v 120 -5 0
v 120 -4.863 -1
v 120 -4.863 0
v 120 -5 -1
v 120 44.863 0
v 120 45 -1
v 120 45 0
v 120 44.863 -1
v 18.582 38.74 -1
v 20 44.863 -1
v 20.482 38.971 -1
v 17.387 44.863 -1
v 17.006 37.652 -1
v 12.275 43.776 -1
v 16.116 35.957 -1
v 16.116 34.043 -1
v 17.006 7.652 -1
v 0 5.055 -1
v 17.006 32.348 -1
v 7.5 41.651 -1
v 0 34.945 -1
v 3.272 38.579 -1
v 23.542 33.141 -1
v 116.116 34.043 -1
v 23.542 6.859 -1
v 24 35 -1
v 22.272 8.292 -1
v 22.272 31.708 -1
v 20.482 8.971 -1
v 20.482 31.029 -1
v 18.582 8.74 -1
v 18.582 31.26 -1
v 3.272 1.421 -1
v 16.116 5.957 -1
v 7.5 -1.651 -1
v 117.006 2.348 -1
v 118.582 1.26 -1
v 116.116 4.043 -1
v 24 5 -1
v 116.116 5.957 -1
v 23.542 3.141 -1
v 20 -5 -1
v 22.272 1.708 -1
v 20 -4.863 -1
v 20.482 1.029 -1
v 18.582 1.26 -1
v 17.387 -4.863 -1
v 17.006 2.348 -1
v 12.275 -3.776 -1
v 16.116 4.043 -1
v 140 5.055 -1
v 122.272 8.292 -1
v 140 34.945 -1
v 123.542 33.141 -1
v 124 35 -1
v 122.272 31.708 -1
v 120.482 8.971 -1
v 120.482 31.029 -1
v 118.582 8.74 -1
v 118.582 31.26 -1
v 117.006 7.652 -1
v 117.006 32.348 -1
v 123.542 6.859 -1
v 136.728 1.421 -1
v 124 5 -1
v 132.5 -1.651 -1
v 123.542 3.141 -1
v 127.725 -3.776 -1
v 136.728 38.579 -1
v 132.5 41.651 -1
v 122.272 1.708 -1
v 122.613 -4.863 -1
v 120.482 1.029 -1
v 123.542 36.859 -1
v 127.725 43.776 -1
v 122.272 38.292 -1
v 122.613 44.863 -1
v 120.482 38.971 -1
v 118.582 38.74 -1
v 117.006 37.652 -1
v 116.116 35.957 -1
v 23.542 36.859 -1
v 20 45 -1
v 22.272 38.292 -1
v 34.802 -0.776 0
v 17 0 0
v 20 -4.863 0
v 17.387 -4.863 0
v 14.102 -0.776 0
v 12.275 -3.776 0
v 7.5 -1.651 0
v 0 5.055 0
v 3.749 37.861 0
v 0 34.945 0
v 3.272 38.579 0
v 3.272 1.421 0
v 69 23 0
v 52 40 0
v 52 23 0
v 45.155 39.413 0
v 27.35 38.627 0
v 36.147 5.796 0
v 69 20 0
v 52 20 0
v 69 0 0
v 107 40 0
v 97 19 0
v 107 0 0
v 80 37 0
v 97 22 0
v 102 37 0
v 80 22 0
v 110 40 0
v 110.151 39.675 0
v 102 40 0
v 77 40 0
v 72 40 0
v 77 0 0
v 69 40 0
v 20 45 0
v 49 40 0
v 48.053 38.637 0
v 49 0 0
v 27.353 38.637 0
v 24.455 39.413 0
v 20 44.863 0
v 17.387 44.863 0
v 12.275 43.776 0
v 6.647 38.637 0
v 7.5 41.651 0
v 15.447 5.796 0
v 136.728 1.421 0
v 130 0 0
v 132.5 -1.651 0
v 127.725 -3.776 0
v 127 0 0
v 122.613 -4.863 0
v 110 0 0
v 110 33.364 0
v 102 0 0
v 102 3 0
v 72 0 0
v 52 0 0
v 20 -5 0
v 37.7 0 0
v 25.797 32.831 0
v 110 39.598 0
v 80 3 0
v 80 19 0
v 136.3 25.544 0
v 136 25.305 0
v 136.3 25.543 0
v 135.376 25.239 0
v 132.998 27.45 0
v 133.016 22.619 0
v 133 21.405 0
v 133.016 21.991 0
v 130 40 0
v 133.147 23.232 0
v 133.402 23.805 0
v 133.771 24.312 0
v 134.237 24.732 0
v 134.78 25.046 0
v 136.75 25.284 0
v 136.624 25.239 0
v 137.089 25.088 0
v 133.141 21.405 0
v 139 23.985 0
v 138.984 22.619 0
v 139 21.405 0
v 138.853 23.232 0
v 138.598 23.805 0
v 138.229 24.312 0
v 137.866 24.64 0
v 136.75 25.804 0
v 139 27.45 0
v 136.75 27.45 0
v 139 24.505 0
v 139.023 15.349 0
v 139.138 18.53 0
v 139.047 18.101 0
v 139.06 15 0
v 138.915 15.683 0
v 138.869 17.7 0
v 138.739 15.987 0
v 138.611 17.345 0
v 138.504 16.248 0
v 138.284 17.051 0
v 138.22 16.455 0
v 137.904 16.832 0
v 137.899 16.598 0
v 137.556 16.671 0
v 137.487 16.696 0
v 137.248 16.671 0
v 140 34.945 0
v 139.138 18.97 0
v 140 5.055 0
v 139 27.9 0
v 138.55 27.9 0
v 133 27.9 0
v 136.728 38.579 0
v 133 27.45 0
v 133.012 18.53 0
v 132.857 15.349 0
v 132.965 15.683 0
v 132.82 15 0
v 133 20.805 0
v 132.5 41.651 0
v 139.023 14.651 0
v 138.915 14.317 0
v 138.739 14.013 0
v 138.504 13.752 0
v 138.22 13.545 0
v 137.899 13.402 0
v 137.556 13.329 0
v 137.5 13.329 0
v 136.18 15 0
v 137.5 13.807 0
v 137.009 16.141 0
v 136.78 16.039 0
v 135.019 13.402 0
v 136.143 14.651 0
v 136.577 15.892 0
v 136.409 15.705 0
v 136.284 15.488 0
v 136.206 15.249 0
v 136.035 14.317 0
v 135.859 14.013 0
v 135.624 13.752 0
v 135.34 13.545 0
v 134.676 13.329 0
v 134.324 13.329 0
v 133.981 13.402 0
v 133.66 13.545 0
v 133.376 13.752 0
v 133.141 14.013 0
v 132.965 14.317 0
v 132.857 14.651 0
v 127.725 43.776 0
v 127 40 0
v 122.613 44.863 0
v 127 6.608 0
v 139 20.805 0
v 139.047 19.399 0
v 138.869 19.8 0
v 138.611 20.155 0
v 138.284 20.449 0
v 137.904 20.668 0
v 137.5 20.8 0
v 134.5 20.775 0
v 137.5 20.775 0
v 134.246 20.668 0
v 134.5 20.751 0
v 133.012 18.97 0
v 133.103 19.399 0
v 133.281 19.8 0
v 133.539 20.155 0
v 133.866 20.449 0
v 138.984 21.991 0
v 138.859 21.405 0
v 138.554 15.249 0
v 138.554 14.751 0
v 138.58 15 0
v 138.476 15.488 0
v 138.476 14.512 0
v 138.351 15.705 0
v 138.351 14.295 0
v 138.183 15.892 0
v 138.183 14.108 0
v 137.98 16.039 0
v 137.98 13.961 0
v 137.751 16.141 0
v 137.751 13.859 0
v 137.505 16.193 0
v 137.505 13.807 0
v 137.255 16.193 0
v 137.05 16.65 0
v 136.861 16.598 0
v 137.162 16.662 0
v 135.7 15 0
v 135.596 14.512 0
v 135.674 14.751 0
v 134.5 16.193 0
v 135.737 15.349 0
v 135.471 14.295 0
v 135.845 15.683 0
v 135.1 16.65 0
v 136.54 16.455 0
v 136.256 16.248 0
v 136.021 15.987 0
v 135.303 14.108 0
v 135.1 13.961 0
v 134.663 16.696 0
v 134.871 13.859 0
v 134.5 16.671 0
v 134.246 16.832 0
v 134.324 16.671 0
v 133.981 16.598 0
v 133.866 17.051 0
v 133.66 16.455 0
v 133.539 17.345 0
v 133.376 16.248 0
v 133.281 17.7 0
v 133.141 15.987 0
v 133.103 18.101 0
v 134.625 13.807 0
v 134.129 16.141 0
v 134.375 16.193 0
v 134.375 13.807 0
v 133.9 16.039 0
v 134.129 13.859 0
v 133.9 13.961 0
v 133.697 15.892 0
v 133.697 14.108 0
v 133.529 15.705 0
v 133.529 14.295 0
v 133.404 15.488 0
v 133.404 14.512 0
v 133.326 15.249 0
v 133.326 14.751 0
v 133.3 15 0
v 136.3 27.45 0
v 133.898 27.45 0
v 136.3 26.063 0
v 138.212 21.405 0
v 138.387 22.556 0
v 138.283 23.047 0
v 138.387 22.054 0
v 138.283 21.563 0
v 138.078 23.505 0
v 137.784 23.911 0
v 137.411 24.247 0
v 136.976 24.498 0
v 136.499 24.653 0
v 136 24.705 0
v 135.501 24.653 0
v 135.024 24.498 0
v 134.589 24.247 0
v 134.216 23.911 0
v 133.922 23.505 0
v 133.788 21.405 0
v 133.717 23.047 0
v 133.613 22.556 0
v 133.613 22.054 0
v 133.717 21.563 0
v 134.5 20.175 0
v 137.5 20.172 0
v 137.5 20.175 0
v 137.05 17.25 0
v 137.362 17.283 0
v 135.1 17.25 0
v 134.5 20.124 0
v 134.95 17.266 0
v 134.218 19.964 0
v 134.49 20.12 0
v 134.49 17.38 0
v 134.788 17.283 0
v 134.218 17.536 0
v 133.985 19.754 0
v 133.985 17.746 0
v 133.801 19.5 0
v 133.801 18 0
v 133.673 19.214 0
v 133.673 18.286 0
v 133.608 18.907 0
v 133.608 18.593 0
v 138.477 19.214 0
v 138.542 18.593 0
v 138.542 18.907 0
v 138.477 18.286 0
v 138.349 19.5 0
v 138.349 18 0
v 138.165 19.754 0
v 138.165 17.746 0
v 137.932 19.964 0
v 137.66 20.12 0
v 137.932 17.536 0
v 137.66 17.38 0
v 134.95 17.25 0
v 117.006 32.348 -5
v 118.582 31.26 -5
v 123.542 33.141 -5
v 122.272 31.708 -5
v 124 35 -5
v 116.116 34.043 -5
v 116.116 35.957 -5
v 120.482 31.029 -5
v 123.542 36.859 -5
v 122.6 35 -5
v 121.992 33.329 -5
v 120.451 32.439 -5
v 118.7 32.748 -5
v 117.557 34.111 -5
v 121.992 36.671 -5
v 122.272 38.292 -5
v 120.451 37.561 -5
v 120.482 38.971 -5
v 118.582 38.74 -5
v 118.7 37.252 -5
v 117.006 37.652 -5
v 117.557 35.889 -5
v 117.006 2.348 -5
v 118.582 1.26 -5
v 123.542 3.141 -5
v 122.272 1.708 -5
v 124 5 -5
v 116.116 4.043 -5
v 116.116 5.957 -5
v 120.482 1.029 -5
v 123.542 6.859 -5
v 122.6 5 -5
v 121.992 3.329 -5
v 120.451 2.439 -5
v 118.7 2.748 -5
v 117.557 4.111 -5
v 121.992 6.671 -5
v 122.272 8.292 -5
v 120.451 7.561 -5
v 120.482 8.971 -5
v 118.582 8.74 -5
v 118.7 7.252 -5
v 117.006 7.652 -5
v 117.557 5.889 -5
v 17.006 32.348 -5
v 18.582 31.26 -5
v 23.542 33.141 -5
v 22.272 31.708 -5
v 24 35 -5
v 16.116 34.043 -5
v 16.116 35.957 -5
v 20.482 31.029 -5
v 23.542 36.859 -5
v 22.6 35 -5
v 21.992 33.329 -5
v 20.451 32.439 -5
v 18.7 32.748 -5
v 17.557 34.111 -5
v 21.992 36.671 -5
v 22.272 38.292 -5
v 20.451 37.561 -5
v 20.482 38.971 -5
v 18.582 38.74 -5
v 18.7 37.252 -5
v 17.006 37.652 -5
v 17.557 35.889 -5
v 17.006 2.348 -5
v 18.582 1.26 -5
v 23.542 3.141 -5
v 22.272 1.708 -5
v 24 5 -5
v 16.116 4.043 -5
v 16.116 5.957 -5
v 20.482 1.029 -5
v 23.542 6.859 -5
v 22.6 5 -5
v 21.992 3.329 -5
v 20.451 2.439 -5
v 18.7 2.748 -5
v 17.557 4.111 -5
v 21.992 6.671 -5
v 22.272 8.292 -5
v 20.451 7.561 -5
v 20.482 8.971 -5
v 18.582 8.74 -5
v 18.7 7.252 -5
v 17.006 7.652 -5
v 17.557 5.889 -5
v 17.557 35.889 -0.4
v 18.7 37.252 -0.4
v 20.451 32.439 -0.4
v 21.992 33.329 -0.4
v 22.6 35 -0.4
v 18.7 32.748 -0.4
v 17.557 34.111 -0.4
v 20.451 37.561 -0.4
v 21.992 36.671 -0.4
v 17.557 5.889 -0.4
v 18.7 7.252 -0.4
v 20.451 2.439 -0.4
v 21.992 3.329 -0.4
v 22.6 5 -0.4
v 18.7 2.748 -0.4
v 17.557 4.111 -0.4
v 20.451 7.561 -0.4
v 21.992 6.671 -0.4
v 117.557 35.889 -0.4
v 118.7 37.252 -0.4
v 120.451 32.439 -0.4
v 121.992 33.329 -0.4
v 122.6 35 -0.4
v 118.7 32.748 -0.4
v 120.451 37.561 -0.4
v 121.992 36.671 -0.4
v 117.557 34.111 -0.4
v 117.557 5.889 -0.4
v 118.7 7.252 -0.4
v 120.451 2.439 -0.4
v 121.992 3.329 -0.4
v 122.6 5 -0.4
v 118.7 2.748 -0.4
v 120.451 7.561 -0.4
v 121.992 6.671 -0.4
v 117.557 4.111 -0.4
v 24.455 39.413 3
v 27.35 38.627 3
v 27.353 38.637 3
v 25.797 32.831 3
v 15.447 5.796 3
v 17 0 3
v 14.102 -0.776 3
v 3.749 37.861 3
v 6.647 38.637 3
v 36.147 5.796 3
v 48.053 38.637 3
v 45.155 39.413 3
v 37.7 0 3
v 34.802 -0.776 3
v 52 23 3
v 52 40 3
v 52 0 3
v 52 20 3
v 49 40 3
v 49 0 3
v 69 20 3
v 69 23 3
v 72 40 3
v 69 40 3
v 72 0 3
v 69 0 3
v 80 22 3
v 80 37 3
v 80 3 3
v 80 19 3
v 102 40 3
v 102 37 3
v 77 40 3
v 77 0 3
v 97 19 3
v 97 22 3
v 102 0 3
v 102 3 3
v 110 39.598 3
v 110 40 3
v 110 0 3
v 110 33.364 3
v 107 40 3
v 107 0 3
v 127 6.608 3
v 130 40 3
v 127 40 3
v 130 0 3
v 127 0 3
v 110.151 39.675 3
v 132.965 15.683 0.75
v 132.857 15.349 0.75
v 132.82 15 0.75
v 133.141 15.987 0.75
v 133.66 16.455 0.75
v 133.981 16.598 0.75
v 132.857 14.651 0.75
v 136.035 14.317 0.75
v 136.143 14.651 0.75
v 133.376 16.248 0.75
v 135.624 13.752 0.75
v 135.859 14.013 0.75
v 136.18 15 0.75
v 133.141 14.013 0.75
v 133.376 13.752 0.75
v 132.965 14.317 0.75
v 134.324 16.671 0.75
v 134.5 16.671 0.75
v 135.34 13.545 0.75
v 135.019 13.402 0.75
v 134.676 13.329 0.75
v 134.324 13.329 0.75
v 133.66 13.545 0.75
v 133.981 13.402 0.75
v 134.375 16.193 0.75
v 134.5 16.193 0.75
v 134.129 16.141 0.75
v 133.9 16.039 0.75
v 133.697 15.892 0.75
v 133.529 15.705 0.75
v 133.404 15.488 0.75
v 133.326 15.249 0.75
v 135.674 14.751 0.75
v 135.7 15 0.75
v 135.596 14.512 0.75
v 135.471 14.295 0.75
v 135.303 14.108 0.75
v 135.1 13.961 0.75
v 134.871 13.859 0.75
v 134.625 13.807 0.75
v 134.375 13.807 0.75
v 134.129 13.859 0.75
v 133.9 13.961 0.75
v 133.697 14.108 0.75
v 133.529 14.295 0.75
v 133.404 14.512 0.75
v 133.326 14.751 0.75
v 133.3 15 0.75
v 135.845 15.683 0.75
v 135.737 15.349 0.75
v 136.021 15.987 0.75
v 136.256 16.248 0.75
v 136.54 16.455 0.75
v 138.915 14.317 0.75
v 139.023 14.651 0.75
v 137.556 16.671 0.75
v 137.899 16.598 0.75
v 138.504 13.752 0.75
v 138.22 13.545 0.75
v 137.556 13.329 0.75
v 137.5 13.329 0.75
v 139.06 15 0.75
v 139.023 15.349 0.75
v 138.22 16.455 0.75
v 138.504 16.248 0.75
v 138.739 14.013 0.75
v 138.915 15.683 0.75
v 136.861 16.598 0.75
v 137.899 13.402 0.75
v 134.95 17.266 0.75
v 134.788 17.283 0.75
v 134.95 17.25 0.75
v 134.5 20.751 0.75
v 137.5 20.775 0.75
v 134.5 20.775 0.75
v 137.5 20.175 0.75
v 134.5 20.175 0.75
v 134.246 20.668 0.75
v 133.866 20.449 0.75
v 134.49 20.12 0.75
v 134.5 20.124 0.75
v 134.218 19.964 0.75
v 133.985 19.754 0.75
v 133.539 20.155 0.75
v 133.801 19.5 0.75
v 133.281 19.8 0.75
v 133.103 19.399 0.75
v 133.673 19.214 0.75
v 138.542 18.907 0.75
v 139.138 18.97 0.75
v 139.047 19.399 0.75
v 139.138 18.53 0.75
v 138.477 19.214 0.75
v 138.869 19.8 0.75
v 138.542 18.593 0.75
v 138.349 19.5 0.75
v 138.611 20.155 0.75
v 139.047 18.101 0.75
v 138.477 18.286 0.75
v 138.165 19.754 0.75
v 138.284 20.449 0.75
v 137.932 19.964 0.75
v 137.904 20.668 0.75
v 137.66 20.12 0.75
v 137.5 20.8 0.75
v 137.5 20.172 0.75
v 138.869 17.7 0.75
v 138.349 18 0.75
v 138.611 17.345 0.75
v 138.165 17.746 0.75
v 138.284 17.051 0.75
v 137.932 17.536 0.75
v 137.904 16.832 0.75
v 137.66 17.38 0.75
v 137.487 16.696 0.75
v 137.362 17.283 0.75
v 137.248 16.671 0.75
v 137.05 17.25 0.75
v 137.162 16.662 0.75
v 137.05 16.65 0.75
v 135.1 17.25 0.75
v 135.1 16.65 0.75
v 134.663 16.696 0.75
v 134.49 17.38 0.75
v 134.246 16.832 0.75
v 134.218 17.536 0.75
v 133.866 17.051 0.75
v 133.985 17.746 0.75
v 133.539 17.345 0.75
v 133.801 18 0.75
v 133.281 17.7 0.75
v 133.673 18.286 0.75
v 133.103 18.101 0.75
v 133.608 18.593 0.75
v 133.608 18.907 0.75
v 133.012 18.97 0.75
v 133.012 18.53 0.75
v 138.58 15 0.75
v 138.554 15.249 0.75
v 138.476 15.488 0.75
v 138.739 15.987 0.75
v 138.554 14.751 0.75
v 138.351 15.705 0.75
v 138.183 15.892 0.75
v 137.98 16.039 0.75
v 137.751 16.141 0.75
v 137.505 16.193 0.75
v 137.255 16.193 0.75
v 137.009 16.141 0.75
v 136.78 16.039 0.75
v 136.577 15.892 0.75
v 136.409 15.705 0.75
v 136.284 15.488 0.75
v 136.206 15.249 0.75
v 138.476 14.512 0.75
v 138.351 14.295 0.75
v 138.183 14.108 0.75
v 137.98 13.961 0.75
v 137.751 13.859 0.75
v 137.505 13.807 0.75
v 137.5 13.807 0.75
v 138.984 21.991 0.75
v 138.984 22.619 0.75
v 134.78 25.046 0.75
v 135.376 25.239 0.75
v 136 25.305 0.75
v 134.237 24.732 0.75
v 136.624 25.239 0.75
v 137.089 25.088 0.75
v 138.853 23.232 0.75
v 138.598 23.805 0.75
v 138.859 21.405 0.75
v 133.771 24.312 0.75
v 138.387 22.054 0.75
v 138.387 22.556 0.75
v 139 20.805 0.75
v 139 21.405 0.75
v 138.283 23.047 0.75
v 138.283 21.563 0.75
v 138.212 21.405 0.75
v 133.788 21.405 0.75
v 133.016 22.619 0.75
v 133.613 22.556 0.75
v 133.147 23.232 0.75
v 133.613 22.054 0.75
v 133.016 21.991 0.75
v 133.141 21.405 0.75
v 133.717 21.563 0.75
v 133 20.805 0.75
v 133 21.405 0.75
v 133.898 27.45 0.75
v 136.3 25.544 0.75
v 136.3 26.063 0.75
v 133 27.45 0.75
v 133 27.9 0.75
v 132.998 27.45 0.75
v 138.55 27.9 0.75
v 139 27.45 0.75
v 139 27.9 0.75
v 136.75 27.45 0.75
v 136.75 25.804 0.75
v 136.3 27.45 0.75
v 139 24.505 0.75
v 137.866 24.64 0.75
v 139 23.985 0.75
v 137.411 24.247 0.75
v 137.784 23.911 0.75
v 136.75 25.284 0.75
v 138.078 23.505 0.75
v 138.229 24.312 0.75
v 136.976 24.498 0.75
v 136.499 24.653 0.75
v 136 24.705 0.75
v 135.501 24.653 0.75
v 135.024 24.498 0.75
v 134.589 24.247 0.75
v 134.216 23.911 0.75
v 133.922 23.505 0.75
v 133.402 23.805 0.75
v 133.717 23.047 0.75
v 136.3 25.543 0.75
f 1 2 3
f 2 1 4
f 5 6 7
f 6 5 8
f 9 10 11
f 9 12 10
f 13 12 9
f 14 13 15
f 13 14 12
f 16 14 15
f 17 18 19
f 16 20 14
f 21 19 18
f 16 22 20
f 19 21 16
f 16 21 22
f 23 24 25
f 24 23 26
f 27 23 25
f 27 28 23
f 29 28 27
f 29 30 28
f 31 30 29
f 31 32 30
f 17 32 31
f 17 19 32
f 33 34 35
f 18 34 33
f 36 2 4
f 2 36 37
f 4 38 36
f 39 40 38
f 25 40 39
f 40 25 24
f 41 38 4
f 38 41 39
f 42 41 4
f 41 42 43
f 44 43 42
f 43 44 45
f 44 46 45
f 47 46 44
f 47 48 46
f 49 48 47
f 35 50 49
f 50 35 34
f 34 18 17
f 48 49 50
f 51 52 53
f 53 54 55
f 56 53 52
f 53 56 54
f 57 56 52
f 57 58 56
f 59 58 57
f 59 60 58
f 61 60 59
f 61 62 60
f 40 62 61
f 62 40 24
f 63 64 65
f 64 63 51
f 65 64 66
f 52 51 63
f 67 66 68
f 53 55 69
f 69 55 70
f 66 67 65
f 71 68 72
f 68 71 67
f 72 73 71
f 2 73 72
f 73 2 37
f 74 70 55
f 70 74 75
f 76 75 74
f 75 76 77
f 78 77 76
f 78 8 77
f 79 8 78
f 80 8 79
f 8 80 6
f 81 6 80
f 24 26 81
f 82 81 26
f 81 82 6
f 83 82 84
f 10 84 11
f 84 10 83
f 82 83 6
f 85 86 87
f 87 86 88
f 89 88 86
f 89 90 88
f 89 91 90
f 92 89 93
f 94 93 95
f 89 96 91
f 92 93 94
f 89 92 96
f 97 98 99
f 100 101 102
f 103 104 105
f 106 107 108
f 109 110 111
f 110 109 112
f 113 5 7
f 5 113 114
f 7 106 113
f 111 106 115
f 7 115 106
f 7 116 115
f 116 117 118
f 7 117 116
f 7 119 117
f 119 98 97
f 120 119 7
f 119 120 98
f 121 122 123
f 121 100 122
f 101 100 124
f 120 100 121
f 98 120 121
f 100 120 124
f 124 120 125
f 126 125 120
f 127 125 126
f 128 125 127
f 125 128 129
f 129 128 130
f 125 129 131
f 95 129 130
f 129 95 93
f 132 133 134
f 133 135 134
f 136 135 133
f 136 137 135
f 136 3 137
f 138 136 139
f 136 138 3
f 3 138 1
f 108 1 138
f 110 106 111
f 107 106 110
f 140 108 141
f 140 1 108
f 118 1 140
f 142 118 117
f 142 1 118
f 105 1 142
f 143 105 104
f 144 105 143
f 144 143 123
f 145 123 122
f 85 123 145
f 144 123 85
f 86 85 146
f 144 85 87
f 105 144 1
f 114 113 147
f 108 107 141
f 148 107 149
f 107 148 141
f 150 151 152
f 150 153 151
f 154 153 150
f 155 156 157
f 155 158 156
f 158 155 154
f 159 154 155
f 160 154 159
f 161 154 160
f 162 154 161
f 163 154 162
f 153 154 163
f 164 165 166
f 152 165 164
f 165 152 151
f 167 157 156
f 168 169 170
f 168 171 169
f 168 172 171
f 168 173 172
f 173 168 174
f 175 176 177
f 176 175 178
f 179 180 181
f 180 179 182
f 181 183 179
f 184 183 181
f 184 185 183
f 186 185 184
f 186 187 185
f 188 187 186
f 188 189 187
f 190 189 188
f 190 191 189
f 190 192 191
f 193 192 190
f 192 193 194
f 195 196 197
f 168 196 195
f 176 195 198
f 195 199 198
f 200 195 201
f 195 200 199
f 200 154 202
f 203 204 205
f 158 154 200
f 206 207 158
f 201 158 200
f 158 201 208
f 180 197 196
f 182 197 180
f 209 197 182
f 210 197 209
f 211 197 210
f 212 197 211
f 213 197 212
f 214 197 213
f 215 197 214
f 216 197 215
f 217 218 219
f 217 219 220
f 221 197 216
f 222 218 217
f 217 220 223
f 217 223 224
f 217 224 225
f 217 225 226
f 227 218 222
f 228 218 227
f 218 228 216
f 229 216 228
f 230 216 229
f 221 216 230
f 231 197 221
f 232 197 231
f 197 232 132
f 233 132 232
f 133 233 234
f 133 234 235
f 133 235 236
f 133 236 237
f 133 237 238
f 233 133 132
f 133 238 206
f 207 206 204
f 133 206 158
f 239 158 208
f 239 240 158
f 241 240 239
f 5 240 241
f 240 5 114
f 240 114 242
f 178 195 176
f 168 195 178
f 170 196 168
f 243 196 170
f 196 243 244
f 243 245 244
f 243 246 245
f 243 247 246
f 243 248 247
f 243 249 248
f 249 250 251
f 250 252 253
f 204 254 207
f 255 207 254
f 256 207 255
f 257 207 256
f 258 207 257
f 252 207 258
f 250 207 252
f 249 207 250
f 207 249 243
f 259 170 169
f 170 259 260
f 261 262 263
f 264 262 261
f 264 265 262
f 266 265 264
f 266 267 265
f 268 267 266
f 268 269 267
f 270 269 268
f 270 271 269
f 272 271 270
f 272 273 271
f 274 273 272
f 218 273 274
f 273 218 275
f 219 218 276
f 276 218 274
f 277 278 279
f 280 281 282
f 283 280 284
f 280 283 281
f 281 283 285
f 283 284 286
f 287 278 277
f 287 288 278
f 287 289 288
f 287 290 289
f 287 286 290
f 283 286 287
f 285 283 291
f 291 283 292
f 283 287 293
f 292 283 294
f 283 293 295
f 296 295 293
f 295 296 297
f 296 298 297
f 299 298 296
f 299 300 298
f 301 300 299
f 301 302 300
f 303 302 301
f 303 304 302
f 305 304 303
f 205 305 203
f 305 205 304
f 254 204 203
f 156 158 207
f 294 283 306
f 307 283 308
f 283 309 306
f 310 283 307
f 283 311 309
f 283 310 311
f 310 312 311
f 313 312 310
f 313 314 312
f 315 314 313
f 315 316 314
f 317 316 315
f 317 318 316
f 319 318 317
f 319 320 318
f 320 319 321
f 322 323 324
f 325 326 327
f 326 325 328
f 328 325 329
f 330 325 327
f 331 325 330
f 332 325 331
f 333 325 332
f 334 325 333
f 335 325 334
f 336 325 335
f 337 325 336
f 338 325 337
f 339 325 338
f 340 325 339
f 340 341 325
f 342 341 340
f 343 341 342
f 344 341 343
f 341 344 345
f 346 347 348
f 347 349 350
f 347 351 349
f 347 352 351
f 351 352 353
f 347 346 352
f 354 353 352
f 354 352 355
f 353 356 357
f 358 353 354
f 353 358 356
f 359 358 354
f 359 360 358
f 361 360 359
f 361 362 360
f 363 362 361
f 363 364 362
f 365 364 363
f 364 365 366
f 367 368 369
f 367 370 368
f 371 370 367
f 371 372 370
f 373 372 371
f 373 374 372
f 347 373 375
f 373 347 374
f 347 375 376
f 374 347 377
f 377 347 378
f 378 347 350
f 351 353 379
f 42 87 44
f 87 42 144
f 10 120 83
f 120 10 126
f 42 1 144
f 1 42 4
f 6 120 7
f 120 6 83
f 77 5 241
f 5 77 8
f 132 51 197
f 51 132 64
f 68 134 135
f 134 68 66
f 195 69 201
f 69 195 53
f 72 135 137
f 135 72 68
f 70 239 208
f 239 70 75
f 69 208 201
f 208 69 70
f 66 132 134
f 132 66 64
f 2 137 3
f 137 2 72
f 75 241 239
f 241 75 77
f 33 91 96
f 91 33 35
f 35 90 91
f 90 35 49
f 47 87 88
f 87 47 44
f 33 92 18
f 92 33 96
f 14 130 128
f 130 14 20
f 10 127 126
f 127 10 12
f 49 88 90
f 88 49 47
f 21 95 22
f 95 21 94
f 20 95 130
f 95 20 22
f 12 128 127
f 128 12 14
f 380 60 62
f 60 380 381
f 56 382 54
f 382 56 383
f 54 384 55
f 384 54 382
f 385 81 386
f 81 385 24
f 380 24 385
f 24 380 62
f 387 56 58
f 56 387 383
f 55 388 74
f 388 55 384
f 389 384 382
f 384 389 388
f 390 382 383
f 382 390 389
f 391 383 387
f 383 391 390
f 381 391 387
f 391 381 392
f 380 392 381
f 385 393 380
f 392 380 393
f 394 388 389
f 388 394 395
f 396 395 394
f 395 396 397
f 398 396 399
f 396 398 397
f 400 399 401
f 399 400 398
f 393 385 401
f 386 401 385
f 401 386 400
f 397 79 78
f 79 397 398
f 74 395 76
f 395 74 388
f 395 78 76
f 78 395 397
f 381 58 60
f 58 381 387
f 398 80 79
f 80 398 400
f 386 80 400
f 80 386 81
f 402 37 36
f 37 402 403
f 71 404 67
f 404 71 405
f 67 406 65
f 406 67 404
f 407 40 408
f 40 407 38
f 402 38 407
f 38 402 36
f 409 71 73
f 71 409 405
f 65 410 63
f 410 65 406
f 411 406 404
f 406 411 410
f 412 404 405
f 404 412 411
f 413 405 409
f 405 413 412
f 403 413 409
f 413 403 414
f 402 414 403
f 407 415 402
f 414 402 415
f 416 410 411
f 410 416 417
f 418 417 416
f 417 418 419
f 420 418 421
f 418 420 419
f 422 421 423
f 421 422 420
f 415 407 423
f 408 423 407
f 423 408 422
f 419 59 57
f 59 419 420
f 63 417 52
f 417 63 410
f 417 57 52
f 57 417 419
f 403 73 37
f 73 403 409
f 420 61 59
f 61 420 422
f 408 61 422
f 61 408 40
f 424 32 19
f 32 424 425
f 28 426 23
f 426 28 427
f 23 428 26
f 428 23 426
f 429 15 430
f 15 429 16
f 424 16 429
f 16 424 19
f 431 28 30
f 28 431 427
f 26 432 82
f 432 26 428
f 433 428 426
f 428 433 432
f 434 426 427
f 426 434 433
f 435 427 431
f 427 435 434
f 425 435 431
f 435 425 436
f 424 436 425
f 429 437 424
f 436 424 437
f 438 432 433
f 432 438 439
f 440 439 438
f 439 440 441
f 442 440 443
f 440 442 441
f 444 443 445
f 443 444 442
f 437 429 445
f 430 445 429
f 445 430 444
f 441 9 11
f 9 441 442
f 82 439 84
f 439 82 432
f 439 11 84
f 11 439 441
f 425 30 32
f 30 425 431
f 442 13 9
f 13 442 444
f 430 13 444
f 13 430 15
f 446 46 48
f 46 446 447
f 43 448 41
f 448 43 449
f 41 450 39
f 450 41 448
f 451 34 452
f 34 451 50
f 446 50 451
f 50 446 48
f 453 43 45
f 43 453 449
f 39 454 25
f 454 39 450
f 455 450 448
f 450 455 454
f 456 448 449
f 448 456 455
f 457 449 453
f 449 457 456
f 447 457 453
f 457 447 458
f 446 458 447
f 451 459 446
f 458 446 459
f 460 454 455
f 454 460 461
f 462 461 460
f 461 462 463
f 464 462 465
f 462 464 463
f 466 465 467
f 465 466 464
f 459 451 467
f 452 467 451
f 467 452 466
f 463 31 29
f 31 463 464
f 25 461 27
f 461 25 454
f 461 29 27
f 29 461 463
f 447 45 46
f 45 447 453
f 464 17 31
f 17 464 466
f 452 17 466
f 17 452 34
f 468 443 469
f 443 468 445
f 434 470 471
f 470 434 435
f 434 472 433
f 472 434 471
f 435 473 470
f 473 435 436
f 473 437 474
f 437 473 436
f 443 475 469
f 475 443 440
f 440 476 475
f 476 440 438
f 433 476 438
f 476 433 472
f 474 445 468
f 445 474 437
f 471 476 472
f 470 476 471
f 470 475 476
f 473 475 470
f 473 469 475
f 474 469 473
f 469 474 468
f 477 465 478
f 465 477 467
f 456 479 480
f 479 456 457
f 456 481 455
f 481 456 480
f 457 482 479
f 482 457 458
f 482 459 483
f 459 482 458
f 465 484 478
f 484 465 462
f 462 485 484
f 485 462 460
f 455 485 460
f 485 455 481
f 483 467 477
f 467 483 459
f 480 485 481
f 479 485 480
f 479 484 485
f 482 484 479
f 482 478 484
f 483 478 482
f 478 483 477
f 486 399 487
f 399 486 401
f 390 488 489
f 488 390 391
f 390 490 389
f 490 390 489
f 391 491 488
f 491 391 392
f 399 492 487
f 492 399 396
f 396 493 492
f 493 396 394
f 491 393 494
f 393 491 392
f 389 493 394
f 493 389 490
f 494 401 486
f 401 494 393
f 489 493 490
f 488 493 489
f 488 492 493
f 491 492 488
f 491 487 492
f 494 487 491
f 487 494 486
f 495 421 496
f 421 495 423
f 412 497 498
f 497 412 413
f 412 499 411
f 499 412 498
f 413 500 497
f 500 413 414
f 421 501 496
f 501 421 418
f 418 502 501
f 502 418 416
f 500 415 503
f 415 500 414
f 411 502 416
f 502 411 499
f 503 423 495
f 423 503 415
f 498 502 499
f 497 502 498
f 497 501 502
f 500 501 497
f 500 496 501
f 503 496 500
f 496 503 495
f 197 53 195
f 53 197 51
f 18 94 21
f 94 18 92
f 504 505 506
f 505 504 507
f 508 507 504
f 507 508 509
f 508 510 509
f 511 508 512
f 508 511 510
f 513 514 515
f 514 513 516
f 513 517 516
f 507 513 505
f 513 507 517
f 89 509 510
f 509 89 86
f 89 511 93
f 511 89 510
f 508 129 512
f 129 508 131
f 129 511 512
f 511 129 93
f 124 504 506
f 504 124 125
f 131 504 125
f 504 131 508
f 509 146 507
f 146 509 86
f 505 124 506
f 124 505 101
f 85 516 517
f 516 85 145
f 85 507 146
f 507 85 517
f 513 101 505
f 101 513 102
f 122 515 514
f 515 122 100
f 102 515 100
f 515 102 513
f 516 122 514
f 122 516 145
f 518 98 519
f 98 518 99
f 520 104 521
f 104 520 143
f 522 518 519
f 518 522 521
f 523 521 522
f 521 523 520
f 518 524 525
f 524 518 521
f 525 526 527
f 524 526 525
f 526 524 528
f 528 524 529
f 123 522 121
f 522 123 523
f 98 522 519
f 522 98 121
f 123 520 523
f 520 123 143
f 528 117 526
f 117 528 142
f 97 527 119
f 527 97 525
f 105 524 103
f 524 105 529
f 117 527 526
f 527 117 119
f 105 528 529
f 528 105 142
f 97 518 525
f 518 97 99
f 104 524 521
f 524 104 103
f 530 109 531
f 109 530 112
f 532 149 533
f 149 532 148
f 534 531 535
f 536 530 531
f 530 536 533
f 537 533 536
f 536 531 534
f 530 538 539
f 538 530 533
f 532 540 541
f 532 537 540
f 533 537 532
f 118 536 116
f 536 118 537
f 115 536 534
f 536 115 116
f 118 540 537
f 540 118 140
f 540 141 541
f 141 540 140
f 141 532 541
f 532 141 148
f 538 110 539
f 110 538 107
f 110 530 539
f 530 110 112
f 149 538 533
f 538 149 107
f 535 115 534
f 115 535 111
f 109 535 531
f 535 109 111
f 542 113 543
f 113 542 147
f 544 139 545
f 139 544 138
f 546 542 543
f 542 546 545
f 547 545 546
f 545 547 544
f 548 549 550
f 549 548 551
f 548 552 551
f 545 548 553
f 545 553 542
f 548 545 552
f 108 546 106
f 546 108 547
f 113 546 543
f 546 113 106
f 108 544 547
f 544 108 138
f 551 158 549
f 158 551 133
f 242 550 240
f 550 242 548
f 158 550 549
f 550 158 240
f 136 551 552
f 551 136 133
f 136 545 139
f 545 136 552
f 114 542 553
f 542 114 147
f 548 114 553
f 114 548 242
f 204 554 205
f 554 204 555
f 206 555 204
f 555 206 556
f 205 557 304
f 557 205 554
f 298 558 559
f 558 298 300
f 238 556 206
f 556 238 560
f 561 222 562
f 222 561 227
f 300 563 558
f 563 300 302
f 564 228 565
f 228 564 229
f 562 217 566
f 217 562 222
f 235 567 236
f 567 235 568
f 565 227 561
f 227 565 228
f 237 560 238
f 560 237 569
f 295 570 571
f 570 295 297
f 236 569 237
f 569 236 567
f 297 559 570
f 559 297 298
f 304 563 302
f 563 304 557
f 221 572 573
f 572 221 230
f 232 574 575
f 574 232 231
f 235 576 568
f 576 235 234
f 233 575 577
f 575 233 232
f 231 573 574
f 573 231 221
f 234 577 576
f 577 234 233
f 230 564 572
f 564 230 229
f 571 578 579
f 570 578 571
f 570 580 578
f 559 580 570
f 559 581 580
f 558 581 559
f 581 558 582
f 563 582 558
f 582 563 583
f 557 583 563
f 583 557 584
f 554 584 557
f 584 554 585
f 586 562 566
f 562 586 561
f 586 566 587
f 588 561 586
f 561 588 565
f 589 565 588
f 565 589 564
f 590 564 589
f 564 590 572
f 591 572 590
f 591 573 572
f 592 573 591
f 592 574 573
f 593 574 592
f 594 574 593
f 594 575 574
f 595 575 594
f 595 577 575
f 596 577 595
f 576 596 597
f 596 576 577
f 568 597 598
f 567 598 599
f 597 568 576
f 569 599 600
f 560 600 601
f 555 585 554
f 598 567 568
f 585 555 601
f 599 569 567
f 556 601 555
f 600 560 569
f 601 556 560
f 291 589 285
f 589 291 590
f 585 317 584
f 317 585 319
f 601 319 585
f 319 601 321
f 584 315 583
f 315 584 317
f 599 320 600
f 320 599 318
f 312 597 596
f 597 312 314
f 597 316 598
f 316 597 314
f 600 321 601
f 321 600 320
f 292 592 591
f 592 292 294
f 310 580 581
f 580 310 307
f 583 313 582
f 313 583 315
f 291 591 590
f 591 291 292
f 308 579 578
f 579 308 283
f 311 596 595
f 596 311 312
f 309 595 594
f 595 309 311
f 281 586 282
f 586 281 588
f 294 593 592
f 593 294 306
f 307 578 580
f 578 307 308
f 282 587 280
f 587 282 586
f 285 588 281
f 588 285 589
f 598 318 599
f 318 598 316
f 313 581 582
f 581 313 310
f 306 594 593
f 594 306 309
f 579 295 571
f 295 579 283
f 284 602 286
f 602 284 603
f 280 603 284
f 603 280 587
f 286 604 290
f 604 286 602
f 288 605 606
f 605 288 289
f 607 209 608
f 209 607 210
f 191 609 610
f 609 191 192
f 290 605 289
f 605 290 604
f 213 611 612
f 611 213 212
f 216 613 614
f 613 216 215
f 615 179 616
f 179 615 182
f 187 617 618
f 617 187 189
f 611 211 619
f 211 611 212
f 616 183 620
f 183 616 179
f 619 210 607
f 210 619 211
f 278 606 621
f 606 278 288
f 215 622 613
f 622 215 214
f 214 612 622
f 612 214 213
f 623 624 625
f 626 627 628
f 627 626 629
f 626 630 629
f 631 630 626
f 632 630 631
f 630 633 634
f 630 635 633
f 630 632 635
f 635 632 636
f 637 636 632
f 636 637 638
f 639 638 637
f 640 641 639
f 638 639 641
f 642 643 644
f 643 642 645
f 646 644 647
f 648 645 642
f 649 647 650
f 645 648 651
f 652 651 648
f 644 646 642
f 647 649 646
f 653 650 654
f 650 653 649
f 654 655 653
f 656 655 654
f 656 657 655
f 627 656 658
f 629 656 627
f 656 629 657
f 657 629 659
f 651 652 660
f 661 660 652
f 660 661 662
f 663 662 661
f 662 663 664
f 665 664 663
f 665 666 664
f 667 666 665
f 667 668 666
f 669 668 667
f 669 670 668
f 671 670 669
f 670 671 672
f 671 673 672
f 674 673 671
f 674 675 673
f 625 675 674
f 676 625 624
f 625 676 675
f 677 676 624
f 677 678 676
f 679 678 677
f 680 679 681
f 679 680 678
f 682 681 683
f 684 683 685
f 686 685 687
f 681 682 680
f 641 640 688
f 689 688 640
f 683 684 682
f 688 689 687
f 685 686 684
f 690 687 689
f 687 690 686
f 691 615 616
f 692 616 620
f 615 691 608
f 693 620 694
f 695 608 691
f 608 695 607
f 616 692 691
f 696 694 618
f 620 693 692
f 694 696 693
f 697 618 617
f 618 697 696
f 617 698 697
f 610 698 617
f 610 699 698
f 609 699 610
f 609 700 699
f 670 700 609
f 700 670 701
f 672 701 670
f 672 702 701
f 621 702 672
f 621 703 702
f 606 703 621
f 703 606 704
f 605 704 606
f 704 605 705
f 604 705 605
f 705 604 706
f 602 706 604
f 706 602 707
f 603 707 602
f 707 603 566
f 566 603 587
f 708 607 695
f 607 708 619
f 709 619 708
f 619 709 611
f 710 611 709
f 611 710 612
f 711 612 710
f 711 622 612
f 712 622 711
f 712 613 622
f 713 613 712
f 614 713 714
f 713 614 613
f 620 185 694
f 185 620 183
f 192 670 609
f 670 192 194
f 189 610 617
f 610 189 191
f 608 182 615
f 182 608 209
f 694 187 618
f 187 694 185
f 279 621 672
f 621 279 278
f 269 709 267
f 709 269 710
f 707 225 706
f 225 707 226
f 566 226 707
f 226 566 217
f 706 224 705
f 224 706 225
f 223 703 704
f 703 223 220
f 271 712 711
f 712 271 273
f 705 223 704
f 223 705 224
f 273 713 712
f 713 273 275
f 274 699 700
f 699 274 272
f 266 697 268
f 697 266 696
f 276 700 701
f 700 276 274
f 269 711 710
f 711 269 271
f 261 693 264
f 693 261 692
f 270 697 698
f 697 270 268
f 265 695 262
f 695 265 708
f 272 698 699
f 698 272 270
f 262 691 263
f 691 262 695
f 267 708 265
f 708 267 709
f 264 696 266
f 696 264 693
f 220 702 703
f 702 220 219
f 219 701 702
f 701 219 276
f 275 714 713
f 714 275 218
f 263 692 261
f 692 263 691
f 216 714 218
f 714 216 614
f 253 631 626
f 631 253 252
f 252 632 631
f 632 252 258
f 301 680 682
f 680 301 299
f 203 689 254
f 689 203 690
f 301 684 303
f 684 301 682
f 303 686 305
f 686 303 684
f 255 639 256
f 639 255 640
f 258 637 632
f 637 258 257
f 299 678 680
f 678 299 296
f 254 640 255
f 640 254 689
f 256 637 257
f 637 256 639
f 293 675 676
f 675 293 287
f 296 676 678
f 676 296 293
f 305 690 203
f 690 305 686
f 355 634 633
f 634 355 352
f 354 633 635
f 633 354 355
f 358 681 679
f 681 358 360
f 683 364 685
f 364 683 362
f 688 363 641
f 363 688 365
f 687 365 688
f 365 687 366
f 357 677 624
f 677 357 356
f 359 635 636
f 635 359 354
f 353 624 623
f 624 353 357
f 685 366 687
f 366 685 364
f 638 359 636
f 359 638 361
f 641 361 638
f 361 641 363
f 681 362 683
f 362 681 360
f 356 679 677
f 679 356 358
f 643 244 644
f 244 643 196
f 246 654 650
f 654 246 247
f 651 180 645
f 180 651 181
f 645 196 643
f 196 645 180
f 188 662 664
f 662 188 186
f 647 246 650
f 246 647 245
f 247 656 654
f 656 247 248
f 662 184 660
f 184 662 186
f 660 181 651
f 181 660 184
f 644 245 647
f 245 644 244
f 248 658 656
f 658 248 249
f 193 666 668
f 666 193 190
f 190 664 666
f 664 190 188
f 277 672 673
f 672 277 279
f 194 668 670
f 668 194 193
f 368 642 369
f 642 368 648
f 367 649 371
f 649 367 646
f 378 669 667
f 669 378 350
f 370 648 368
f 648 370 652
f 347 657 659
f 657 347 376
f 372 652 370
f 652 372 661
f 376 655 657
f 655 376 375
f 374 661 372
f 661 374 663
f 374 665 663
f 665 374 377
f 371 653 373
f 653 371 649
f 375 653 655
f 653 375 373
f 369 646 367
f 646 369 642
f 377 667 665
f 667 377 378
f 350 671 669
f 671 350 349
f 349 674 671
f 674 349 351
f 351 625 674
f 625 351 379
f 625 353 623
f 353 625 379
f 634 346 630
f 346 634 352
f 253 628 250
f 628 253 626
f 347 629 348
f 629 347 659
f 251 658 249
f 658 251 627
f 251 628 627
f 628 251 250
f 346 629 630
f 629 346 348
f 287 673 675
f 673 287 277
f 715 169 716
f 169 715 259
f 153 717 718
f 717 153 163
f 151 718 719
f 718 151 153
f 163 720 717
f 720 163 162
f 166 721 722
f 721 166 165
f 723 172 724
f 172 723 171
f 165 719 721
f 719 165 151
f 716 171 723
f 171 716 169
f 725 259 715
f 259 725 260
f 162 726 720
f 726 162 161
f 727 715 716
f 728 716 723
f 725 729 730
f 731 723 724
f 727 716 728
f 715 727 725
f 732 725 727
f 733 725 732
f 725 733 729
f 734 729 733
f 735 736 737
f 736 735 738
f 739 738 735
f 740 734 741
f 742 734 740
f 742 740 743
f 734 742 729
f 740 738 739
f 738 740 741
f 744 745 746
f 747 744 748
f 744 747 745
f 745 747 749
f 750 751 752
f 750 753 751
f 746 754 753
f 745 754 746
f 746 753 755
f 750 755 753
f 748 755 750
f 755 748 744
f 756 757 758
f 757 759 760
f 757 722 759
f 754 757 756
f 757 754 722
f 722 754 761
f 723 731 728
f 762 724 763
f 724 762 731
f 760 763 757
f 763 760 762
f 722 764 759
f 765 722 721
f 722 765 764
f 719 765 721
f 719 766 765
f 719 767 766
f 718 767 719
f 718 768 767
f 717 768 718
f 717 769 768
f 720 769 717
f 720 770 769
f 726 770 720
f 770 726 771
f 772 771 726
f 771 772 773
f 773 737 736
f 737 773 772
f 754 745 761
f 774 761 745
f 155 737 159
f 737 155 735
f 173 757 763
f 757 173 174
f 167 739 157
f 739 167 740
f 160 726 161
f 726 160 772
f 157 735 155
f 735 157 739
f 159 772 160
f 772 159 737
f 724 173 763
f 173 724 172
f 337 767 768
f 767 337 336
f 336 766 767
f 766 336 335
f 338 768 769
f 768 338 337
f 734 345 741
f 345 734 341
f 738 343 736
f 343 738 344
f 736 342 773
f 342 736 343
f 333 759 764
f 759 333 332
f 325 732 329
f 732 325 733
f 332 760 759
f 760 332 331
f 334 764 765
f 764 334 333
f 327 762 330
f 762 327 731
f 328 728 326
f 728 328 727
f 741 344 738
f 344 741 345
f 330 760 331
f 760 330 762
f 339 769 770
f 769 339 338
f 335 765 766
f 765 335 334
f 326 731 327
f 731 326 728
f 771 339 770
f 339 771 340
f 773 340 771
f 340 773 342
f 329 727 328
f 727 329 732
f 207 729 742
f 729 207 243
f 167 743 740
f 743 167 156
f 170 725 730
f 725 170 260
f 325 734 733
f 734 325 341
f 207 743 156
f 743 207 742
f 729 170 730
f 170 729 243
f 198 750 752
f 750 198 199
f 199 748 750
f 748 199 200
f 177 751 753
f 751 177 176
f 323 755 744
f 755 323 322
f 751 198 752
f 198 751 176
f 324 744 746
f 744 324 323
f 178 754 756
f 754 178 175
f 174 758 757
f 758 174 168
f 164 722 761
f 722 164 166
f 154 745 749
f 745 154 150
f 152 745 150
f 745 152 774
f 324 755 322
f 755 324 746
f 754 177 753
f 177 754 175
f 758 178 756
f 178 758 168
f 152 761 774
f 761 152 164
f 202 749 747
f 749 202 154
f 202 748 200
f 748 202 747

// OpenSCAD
//основa
union(){
 rotate([0,900,180]) translate([20,-45,0])
difference(){  
 union(){  

  cube([100,50,1]);
   translate([100,25,0]) cylinder(1,25,25);
    translate([0,25,0]) cylinder(1,25,25);
  
  translate([100,10,0]) cylinder(5,4,4);
  translate([100,40,0]) cylinder(5,4,4);
  translate([0,10,0]) cylinder(5,4,4);
  translate([0,40,0]) cylinder(5,4,4);
}
  

  #translate([0,10,0.4]) cylinder(5,2.6,2.6);
  #translate([0,40,0.4]) cylinder(5,2.6,2.6);
  #translate([100,10,0.4]) cylinder(5,2.6,2.6);
  #translate([100,40,0.4]) cylinder(5,2.6,2.6);
  translate([120,0,-2]) cube([5,50,9]);
  translate([-25,0,-2]) cube([5,50,9]);
  }


}
//буква w
union(){
translate([0,0,0])
  rotate([0,0,90])
union(){
  translate([0,-17,0]) rotate([0,0,15]) cube([40,3,3]);
  translate([0,-17,0]) rotate([0,0,-15]) cube([40,3,3]);

 translate([0,-37.7,0]) rotate([0,0,15]) cube([40,3,3]);

 translate([0,-37.7,0])
  rotate([0,0,-15]) cube([40,3,3]);
}
}

//буква h
translate([49,0,0])
union(){
 cube([3,40,3]);
 translate([20,0,0]) cube([3,40,3]);
 translate([0,20,0]) cube([20,3,3]);
}

//E
translate([77,0,0])
union(){ 
 cube([3,40,3]);
 cube([25,3,3]);
 translate([0,19,0]) cube([20,3,3]);
 translate([0,37,0]) cube([25,3,3]);
}

//N
translate([107,0,0])
union(){
 cube([3,40,3]);
 translate([20,0,0,]) cube([3,40,3]);
 translate([20,0,0]) rotate([0,0,27]) cube([3,43,3]);
}

//Soda
rotate([0,0,90]) translate([15,-139,0])
scale([0.15,0.15,0.25]){
// S
 translate([0,30,3])
rotate([180,0,90]){
scale([0.8,0.8,1]){
union(){
difference(){
 cylinder(3,14,14);
translate([0,0,-1]) cylinder(5,10,10);
 translate([-20,0,-1]) cube(20);

}
}
difference(){
 translate([-24,0,0]) cylinder(3,14,14);
 translate([-24,0,-1]) cylinder(5,10,10);
 translate([-25,-20,-1]) cube(20);

}
}
}

// буква О
translate([-15,0,0])
union(){
  translate([49.5,10,0]) cube([4,20,3]);
  translate([26,13,0]) cube([4,13,3]);
difference(){
union(){
	
  difference(){
  translate([40,26,0]) cylinder(3,14,14);
  translate([40,26,-1]) cylinder(5,10,10);
  translate([33,10,-1]) cube([20,10,5]);

}

difference(){
  translate([40,13,0]) cylinder(3,14,14);
  translate([40,13,-1]) cylinder(5,10,10);
  translate([32,17,-1]) cube([19,10,5]);
  translate([40,17,-1]) cube(20);
}
}
  translate([30,13,-1]) cube([5,14,5]);
  translate([42,10,-1]) cube(20);
}
}

//D
translate([43.7,0,0]) 
union(){
   translate([-5,0,0]) cube([4,40,3]);
 difference(){
    translate([5,20,0]) cylinder(3,20,20);
     translate([5,20,-1]) cylinder(6,16,16);
      translate([-15,0,-1]) cube([10,40,6]);
}
}
 translate([83,0,0])
   union(){
      difference(){
   union(){
    cube([3,40,3]);
   translate([-23.1,0,0]) rotate([0,0,-30])  cube([3,50,3]);
   translate([-15,15,0]) cube([20,3,3]);
}
   translate([-40,-8,-1]) cube([30,8,5]);
   translate([3,3,-1]) cube([10,40,5]);
  translate([-34.65,0,-1]) rotate([0,0,-30]) cube([10,40,5]);
  translate([0,40,-1]) cube(10);
}
}  
}
